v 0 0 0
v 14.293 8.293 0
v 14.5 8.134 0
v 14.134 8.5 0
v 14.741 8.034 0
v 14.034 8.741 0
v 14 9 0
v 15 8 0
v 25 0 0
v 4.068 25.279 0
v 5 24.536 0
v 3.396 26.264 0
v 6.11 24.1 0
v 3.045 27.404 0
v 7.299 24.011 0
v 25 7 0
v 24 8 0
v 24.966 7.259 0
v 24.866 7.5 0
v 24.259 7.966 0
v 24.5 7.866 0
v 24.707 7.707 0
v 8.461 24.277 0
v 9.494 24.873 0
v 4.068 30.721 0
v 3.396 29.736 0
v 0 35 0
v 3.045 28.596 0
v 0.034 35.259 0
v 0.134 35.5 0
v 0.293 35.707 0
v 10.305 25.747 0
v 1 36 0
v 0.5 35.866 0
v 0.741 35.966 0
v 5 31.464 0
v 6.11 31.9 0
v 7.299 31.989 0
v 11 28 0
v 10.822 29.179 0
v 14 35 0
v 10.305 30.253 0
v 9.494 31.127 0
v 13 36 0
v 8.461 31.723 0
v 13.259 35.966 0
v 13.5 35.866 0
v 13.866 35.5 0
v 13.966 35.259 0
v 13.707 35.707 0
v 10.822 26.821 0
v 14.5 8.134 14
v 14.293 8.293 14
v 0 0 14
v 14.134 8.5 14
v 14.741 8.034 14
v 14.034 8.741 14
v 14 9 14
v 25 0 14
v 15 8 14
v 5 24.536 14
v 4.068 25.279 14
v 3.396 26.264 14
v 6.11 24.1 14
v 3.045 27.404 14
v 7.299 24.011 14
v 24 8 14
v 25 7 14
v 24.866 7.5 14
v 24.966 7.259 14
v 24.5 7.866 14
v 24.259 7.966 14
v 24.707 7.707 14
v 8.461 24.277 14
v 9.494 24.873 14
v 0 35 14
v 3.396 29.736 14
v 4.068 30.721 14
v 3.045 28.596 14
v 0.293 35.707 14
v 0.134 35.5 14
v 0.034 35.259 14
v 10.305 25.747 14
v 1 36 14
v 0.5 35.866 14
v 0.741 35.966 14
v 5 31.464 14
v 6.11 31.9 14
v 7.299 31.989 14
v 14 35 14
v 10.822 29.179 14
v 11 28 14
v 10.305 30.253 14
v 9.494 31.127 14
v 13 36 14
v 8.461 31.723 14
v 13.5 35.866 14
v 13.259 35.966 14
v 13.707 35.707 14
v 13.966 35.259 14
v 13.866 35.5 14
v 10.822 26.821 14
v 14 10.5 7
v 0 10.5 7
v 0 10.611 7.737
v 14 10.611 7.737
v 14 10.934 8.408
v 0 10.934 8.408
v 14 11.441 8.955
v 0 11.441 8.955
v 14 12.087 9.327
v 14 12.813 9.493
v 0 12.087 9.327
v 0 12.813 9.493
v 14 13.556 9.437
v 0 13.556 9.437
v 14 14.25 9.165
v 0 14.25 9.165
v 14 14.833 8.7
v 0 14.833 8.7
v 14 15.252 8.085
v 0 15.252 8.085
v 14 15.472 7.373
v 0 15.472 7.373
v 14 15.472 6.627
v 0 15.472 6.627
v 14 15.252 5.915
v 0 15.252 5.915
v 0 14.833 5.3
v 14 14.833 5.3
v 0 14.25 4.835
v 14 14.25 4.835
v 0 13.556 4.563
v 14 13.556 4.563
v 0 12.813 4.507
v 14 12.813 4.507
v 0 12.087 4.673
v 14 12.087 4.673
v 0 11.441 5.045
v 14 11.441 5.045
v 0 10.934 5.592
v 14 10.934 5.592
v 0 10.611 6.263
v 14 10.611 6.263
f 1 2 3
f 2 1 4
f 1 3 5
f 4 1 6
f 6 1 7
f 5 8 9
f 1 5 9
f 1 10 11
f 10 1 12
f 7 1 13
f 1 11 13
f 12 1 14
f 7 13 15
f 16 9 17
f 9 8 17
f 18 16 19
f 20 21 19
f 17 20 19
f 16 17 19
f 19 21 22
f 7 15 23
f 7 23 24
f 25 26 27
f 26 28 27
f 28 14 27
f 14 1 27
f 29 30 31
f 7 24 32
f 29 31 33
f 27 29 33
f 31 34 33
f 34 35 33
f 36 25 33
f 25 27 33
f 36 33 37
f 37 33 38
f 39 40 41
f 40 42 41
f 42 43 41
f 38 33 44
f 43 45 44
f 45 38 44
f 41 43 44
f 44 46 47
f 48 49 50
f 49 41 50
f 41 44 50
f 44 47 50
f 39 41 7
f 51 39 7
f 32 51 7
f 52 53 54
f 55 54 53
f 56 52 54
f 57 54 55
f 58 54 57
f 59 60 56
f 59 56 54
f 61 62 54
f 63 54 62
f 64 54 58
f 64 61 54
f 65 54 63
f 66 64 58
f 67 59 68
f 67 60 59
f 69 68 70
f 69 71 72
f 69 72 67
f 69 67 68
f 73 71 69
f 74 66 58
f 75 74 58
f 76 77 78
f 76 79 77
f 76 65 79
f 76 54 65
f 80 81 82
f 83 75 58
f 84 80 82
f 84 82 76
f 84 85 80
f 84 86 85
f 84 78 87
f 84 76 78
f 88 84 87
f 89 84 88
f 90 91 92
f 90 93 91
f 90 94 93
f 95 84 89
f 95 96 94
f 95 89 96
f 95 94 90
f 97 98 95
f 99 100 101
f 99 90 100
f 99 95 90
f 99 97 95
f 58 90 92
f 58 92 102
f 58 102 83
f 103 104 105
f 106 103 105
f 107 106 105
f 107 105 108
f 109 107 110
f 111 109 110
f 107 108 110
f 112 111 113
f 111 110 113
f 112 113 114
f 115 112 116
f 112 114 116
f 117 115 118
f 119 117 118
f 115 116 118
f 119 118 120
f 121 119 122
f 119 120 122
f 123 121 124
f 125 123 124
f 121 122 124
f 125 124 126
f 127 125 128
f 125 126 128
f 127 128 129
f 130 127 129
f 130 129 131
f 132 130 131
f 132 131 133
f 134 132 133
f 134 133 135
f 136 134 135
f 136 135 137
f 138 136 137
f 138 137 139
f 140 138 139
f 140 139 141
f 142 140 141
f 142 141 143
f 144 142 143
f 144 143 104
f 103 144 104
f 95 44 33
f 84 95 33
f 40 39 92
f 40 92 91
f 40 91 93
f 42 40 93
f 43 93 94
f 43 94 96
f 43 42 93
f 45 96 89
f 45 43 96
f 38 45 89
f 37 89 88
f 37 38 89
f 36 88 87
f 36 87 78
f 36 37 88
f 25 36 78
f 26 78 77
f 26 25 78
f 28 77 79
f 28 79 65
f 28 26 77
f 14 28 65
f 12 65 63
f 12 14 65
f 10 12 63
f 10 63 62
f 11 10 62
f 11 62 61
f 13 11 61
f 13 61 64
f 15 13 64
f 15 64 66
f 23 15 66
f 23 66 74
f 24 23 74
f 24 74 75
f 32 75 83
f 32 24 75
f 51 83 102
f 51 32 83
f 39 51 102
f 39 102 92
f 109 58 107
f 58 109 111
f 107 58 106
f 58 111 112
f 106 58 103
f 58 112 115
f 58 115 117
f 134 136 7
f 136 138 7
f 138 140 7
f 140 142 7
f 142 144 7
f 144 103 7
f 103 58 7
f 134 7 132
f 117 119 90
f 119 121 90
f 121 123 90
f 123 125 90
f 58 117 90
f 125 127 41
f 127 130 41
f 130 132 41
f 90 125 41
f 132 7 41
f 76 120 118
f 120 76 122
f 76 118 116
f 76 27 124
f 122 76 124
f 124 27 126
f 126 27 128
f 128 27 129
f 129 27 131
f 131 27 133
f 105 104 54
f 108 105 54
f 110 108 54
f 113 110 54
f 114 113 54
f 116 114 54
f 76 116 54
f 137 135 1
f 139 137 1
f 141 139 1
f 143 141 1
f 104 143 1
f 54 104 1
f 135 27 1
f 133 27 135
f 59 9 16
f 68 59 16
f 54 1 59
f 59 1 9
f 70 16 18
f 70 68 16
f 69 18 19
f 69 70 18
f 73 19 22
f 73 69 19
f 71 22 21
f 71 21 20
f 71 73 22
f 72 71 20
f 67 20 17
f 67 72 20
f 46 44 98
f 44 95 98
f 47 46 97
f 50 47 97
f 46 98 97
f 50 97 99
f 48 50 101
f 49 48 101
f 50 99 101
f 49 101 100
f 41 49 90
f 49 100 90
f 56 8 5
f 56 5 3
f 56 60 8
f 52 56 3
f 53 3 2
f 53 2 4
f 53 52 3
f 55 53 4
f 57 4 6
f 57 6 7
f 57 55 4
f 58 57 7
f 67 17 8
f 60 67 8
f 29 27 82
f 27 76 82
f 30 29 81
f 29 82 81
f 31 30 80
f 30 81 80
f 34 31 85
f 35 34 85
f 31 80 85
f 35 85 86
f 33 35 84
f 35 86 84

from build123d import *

# Parameters (mm, degrees)
SKETCH_R    = 4
PAD_DEPTH   = 14
SKETCH001_R = 2.5
HOLE_DEPTH  = 25
HOLE_TIPS_R = 2.5
FILLET_R    = 1


with BuildPart() as part:
    # Sketch → Pad (new body)
    with BuildSketch(Plane.XY):
        Polygon((0, 0), (25, 0), (25, 8), (14, 8), (14, 36), (0, 36), align=None)
        with Locations((7, 28)):
            Circle(SKETCH_R, mode=Mode.SUBTRACT)
    extrude(amount=PAD_DEPTH)

    # Sketch001 (on Face6 of Pad) → Hole (cut)
    with BuildSketch(Plane(origin=(0, 0, 0), x_dir=(0, -1, 0), z_dir=(-1, 0, 0))):
        with Locations((-13, 7)):
            Circle(SKETCH001_R)
    extrude(amount=-HOLE_DEPTH, mode=Mode.SUBTRACT)

    # Hole tips → Hole tip 1 section 0
    with BuildSketch(Plane(origin=(25, 0, 0), x_dir=(0, -1, 0), z_dir=(-1, 0, 0)), mode=Mode.PRIVATE) as hole_tip_1_s0:
        with Locations((-13, 7)):
            Circle(HOLE_TIPS_R)
    loft([hole_tip_1_s0.sketch, Vertex(26.502152, 13, 7)], mode=Mode.SUBTRACT)

    # Fillet
    fillet_edges = [part.edges().sort_by_distance(p)[0] for p in [
        (14, 8, 7),
        (14, 36, 7),
        (0, 36, 7),
        (25, 8, 7),
    ]]
    fillet(fillet_edges, radius=FILLET_R)


solid = part.part
